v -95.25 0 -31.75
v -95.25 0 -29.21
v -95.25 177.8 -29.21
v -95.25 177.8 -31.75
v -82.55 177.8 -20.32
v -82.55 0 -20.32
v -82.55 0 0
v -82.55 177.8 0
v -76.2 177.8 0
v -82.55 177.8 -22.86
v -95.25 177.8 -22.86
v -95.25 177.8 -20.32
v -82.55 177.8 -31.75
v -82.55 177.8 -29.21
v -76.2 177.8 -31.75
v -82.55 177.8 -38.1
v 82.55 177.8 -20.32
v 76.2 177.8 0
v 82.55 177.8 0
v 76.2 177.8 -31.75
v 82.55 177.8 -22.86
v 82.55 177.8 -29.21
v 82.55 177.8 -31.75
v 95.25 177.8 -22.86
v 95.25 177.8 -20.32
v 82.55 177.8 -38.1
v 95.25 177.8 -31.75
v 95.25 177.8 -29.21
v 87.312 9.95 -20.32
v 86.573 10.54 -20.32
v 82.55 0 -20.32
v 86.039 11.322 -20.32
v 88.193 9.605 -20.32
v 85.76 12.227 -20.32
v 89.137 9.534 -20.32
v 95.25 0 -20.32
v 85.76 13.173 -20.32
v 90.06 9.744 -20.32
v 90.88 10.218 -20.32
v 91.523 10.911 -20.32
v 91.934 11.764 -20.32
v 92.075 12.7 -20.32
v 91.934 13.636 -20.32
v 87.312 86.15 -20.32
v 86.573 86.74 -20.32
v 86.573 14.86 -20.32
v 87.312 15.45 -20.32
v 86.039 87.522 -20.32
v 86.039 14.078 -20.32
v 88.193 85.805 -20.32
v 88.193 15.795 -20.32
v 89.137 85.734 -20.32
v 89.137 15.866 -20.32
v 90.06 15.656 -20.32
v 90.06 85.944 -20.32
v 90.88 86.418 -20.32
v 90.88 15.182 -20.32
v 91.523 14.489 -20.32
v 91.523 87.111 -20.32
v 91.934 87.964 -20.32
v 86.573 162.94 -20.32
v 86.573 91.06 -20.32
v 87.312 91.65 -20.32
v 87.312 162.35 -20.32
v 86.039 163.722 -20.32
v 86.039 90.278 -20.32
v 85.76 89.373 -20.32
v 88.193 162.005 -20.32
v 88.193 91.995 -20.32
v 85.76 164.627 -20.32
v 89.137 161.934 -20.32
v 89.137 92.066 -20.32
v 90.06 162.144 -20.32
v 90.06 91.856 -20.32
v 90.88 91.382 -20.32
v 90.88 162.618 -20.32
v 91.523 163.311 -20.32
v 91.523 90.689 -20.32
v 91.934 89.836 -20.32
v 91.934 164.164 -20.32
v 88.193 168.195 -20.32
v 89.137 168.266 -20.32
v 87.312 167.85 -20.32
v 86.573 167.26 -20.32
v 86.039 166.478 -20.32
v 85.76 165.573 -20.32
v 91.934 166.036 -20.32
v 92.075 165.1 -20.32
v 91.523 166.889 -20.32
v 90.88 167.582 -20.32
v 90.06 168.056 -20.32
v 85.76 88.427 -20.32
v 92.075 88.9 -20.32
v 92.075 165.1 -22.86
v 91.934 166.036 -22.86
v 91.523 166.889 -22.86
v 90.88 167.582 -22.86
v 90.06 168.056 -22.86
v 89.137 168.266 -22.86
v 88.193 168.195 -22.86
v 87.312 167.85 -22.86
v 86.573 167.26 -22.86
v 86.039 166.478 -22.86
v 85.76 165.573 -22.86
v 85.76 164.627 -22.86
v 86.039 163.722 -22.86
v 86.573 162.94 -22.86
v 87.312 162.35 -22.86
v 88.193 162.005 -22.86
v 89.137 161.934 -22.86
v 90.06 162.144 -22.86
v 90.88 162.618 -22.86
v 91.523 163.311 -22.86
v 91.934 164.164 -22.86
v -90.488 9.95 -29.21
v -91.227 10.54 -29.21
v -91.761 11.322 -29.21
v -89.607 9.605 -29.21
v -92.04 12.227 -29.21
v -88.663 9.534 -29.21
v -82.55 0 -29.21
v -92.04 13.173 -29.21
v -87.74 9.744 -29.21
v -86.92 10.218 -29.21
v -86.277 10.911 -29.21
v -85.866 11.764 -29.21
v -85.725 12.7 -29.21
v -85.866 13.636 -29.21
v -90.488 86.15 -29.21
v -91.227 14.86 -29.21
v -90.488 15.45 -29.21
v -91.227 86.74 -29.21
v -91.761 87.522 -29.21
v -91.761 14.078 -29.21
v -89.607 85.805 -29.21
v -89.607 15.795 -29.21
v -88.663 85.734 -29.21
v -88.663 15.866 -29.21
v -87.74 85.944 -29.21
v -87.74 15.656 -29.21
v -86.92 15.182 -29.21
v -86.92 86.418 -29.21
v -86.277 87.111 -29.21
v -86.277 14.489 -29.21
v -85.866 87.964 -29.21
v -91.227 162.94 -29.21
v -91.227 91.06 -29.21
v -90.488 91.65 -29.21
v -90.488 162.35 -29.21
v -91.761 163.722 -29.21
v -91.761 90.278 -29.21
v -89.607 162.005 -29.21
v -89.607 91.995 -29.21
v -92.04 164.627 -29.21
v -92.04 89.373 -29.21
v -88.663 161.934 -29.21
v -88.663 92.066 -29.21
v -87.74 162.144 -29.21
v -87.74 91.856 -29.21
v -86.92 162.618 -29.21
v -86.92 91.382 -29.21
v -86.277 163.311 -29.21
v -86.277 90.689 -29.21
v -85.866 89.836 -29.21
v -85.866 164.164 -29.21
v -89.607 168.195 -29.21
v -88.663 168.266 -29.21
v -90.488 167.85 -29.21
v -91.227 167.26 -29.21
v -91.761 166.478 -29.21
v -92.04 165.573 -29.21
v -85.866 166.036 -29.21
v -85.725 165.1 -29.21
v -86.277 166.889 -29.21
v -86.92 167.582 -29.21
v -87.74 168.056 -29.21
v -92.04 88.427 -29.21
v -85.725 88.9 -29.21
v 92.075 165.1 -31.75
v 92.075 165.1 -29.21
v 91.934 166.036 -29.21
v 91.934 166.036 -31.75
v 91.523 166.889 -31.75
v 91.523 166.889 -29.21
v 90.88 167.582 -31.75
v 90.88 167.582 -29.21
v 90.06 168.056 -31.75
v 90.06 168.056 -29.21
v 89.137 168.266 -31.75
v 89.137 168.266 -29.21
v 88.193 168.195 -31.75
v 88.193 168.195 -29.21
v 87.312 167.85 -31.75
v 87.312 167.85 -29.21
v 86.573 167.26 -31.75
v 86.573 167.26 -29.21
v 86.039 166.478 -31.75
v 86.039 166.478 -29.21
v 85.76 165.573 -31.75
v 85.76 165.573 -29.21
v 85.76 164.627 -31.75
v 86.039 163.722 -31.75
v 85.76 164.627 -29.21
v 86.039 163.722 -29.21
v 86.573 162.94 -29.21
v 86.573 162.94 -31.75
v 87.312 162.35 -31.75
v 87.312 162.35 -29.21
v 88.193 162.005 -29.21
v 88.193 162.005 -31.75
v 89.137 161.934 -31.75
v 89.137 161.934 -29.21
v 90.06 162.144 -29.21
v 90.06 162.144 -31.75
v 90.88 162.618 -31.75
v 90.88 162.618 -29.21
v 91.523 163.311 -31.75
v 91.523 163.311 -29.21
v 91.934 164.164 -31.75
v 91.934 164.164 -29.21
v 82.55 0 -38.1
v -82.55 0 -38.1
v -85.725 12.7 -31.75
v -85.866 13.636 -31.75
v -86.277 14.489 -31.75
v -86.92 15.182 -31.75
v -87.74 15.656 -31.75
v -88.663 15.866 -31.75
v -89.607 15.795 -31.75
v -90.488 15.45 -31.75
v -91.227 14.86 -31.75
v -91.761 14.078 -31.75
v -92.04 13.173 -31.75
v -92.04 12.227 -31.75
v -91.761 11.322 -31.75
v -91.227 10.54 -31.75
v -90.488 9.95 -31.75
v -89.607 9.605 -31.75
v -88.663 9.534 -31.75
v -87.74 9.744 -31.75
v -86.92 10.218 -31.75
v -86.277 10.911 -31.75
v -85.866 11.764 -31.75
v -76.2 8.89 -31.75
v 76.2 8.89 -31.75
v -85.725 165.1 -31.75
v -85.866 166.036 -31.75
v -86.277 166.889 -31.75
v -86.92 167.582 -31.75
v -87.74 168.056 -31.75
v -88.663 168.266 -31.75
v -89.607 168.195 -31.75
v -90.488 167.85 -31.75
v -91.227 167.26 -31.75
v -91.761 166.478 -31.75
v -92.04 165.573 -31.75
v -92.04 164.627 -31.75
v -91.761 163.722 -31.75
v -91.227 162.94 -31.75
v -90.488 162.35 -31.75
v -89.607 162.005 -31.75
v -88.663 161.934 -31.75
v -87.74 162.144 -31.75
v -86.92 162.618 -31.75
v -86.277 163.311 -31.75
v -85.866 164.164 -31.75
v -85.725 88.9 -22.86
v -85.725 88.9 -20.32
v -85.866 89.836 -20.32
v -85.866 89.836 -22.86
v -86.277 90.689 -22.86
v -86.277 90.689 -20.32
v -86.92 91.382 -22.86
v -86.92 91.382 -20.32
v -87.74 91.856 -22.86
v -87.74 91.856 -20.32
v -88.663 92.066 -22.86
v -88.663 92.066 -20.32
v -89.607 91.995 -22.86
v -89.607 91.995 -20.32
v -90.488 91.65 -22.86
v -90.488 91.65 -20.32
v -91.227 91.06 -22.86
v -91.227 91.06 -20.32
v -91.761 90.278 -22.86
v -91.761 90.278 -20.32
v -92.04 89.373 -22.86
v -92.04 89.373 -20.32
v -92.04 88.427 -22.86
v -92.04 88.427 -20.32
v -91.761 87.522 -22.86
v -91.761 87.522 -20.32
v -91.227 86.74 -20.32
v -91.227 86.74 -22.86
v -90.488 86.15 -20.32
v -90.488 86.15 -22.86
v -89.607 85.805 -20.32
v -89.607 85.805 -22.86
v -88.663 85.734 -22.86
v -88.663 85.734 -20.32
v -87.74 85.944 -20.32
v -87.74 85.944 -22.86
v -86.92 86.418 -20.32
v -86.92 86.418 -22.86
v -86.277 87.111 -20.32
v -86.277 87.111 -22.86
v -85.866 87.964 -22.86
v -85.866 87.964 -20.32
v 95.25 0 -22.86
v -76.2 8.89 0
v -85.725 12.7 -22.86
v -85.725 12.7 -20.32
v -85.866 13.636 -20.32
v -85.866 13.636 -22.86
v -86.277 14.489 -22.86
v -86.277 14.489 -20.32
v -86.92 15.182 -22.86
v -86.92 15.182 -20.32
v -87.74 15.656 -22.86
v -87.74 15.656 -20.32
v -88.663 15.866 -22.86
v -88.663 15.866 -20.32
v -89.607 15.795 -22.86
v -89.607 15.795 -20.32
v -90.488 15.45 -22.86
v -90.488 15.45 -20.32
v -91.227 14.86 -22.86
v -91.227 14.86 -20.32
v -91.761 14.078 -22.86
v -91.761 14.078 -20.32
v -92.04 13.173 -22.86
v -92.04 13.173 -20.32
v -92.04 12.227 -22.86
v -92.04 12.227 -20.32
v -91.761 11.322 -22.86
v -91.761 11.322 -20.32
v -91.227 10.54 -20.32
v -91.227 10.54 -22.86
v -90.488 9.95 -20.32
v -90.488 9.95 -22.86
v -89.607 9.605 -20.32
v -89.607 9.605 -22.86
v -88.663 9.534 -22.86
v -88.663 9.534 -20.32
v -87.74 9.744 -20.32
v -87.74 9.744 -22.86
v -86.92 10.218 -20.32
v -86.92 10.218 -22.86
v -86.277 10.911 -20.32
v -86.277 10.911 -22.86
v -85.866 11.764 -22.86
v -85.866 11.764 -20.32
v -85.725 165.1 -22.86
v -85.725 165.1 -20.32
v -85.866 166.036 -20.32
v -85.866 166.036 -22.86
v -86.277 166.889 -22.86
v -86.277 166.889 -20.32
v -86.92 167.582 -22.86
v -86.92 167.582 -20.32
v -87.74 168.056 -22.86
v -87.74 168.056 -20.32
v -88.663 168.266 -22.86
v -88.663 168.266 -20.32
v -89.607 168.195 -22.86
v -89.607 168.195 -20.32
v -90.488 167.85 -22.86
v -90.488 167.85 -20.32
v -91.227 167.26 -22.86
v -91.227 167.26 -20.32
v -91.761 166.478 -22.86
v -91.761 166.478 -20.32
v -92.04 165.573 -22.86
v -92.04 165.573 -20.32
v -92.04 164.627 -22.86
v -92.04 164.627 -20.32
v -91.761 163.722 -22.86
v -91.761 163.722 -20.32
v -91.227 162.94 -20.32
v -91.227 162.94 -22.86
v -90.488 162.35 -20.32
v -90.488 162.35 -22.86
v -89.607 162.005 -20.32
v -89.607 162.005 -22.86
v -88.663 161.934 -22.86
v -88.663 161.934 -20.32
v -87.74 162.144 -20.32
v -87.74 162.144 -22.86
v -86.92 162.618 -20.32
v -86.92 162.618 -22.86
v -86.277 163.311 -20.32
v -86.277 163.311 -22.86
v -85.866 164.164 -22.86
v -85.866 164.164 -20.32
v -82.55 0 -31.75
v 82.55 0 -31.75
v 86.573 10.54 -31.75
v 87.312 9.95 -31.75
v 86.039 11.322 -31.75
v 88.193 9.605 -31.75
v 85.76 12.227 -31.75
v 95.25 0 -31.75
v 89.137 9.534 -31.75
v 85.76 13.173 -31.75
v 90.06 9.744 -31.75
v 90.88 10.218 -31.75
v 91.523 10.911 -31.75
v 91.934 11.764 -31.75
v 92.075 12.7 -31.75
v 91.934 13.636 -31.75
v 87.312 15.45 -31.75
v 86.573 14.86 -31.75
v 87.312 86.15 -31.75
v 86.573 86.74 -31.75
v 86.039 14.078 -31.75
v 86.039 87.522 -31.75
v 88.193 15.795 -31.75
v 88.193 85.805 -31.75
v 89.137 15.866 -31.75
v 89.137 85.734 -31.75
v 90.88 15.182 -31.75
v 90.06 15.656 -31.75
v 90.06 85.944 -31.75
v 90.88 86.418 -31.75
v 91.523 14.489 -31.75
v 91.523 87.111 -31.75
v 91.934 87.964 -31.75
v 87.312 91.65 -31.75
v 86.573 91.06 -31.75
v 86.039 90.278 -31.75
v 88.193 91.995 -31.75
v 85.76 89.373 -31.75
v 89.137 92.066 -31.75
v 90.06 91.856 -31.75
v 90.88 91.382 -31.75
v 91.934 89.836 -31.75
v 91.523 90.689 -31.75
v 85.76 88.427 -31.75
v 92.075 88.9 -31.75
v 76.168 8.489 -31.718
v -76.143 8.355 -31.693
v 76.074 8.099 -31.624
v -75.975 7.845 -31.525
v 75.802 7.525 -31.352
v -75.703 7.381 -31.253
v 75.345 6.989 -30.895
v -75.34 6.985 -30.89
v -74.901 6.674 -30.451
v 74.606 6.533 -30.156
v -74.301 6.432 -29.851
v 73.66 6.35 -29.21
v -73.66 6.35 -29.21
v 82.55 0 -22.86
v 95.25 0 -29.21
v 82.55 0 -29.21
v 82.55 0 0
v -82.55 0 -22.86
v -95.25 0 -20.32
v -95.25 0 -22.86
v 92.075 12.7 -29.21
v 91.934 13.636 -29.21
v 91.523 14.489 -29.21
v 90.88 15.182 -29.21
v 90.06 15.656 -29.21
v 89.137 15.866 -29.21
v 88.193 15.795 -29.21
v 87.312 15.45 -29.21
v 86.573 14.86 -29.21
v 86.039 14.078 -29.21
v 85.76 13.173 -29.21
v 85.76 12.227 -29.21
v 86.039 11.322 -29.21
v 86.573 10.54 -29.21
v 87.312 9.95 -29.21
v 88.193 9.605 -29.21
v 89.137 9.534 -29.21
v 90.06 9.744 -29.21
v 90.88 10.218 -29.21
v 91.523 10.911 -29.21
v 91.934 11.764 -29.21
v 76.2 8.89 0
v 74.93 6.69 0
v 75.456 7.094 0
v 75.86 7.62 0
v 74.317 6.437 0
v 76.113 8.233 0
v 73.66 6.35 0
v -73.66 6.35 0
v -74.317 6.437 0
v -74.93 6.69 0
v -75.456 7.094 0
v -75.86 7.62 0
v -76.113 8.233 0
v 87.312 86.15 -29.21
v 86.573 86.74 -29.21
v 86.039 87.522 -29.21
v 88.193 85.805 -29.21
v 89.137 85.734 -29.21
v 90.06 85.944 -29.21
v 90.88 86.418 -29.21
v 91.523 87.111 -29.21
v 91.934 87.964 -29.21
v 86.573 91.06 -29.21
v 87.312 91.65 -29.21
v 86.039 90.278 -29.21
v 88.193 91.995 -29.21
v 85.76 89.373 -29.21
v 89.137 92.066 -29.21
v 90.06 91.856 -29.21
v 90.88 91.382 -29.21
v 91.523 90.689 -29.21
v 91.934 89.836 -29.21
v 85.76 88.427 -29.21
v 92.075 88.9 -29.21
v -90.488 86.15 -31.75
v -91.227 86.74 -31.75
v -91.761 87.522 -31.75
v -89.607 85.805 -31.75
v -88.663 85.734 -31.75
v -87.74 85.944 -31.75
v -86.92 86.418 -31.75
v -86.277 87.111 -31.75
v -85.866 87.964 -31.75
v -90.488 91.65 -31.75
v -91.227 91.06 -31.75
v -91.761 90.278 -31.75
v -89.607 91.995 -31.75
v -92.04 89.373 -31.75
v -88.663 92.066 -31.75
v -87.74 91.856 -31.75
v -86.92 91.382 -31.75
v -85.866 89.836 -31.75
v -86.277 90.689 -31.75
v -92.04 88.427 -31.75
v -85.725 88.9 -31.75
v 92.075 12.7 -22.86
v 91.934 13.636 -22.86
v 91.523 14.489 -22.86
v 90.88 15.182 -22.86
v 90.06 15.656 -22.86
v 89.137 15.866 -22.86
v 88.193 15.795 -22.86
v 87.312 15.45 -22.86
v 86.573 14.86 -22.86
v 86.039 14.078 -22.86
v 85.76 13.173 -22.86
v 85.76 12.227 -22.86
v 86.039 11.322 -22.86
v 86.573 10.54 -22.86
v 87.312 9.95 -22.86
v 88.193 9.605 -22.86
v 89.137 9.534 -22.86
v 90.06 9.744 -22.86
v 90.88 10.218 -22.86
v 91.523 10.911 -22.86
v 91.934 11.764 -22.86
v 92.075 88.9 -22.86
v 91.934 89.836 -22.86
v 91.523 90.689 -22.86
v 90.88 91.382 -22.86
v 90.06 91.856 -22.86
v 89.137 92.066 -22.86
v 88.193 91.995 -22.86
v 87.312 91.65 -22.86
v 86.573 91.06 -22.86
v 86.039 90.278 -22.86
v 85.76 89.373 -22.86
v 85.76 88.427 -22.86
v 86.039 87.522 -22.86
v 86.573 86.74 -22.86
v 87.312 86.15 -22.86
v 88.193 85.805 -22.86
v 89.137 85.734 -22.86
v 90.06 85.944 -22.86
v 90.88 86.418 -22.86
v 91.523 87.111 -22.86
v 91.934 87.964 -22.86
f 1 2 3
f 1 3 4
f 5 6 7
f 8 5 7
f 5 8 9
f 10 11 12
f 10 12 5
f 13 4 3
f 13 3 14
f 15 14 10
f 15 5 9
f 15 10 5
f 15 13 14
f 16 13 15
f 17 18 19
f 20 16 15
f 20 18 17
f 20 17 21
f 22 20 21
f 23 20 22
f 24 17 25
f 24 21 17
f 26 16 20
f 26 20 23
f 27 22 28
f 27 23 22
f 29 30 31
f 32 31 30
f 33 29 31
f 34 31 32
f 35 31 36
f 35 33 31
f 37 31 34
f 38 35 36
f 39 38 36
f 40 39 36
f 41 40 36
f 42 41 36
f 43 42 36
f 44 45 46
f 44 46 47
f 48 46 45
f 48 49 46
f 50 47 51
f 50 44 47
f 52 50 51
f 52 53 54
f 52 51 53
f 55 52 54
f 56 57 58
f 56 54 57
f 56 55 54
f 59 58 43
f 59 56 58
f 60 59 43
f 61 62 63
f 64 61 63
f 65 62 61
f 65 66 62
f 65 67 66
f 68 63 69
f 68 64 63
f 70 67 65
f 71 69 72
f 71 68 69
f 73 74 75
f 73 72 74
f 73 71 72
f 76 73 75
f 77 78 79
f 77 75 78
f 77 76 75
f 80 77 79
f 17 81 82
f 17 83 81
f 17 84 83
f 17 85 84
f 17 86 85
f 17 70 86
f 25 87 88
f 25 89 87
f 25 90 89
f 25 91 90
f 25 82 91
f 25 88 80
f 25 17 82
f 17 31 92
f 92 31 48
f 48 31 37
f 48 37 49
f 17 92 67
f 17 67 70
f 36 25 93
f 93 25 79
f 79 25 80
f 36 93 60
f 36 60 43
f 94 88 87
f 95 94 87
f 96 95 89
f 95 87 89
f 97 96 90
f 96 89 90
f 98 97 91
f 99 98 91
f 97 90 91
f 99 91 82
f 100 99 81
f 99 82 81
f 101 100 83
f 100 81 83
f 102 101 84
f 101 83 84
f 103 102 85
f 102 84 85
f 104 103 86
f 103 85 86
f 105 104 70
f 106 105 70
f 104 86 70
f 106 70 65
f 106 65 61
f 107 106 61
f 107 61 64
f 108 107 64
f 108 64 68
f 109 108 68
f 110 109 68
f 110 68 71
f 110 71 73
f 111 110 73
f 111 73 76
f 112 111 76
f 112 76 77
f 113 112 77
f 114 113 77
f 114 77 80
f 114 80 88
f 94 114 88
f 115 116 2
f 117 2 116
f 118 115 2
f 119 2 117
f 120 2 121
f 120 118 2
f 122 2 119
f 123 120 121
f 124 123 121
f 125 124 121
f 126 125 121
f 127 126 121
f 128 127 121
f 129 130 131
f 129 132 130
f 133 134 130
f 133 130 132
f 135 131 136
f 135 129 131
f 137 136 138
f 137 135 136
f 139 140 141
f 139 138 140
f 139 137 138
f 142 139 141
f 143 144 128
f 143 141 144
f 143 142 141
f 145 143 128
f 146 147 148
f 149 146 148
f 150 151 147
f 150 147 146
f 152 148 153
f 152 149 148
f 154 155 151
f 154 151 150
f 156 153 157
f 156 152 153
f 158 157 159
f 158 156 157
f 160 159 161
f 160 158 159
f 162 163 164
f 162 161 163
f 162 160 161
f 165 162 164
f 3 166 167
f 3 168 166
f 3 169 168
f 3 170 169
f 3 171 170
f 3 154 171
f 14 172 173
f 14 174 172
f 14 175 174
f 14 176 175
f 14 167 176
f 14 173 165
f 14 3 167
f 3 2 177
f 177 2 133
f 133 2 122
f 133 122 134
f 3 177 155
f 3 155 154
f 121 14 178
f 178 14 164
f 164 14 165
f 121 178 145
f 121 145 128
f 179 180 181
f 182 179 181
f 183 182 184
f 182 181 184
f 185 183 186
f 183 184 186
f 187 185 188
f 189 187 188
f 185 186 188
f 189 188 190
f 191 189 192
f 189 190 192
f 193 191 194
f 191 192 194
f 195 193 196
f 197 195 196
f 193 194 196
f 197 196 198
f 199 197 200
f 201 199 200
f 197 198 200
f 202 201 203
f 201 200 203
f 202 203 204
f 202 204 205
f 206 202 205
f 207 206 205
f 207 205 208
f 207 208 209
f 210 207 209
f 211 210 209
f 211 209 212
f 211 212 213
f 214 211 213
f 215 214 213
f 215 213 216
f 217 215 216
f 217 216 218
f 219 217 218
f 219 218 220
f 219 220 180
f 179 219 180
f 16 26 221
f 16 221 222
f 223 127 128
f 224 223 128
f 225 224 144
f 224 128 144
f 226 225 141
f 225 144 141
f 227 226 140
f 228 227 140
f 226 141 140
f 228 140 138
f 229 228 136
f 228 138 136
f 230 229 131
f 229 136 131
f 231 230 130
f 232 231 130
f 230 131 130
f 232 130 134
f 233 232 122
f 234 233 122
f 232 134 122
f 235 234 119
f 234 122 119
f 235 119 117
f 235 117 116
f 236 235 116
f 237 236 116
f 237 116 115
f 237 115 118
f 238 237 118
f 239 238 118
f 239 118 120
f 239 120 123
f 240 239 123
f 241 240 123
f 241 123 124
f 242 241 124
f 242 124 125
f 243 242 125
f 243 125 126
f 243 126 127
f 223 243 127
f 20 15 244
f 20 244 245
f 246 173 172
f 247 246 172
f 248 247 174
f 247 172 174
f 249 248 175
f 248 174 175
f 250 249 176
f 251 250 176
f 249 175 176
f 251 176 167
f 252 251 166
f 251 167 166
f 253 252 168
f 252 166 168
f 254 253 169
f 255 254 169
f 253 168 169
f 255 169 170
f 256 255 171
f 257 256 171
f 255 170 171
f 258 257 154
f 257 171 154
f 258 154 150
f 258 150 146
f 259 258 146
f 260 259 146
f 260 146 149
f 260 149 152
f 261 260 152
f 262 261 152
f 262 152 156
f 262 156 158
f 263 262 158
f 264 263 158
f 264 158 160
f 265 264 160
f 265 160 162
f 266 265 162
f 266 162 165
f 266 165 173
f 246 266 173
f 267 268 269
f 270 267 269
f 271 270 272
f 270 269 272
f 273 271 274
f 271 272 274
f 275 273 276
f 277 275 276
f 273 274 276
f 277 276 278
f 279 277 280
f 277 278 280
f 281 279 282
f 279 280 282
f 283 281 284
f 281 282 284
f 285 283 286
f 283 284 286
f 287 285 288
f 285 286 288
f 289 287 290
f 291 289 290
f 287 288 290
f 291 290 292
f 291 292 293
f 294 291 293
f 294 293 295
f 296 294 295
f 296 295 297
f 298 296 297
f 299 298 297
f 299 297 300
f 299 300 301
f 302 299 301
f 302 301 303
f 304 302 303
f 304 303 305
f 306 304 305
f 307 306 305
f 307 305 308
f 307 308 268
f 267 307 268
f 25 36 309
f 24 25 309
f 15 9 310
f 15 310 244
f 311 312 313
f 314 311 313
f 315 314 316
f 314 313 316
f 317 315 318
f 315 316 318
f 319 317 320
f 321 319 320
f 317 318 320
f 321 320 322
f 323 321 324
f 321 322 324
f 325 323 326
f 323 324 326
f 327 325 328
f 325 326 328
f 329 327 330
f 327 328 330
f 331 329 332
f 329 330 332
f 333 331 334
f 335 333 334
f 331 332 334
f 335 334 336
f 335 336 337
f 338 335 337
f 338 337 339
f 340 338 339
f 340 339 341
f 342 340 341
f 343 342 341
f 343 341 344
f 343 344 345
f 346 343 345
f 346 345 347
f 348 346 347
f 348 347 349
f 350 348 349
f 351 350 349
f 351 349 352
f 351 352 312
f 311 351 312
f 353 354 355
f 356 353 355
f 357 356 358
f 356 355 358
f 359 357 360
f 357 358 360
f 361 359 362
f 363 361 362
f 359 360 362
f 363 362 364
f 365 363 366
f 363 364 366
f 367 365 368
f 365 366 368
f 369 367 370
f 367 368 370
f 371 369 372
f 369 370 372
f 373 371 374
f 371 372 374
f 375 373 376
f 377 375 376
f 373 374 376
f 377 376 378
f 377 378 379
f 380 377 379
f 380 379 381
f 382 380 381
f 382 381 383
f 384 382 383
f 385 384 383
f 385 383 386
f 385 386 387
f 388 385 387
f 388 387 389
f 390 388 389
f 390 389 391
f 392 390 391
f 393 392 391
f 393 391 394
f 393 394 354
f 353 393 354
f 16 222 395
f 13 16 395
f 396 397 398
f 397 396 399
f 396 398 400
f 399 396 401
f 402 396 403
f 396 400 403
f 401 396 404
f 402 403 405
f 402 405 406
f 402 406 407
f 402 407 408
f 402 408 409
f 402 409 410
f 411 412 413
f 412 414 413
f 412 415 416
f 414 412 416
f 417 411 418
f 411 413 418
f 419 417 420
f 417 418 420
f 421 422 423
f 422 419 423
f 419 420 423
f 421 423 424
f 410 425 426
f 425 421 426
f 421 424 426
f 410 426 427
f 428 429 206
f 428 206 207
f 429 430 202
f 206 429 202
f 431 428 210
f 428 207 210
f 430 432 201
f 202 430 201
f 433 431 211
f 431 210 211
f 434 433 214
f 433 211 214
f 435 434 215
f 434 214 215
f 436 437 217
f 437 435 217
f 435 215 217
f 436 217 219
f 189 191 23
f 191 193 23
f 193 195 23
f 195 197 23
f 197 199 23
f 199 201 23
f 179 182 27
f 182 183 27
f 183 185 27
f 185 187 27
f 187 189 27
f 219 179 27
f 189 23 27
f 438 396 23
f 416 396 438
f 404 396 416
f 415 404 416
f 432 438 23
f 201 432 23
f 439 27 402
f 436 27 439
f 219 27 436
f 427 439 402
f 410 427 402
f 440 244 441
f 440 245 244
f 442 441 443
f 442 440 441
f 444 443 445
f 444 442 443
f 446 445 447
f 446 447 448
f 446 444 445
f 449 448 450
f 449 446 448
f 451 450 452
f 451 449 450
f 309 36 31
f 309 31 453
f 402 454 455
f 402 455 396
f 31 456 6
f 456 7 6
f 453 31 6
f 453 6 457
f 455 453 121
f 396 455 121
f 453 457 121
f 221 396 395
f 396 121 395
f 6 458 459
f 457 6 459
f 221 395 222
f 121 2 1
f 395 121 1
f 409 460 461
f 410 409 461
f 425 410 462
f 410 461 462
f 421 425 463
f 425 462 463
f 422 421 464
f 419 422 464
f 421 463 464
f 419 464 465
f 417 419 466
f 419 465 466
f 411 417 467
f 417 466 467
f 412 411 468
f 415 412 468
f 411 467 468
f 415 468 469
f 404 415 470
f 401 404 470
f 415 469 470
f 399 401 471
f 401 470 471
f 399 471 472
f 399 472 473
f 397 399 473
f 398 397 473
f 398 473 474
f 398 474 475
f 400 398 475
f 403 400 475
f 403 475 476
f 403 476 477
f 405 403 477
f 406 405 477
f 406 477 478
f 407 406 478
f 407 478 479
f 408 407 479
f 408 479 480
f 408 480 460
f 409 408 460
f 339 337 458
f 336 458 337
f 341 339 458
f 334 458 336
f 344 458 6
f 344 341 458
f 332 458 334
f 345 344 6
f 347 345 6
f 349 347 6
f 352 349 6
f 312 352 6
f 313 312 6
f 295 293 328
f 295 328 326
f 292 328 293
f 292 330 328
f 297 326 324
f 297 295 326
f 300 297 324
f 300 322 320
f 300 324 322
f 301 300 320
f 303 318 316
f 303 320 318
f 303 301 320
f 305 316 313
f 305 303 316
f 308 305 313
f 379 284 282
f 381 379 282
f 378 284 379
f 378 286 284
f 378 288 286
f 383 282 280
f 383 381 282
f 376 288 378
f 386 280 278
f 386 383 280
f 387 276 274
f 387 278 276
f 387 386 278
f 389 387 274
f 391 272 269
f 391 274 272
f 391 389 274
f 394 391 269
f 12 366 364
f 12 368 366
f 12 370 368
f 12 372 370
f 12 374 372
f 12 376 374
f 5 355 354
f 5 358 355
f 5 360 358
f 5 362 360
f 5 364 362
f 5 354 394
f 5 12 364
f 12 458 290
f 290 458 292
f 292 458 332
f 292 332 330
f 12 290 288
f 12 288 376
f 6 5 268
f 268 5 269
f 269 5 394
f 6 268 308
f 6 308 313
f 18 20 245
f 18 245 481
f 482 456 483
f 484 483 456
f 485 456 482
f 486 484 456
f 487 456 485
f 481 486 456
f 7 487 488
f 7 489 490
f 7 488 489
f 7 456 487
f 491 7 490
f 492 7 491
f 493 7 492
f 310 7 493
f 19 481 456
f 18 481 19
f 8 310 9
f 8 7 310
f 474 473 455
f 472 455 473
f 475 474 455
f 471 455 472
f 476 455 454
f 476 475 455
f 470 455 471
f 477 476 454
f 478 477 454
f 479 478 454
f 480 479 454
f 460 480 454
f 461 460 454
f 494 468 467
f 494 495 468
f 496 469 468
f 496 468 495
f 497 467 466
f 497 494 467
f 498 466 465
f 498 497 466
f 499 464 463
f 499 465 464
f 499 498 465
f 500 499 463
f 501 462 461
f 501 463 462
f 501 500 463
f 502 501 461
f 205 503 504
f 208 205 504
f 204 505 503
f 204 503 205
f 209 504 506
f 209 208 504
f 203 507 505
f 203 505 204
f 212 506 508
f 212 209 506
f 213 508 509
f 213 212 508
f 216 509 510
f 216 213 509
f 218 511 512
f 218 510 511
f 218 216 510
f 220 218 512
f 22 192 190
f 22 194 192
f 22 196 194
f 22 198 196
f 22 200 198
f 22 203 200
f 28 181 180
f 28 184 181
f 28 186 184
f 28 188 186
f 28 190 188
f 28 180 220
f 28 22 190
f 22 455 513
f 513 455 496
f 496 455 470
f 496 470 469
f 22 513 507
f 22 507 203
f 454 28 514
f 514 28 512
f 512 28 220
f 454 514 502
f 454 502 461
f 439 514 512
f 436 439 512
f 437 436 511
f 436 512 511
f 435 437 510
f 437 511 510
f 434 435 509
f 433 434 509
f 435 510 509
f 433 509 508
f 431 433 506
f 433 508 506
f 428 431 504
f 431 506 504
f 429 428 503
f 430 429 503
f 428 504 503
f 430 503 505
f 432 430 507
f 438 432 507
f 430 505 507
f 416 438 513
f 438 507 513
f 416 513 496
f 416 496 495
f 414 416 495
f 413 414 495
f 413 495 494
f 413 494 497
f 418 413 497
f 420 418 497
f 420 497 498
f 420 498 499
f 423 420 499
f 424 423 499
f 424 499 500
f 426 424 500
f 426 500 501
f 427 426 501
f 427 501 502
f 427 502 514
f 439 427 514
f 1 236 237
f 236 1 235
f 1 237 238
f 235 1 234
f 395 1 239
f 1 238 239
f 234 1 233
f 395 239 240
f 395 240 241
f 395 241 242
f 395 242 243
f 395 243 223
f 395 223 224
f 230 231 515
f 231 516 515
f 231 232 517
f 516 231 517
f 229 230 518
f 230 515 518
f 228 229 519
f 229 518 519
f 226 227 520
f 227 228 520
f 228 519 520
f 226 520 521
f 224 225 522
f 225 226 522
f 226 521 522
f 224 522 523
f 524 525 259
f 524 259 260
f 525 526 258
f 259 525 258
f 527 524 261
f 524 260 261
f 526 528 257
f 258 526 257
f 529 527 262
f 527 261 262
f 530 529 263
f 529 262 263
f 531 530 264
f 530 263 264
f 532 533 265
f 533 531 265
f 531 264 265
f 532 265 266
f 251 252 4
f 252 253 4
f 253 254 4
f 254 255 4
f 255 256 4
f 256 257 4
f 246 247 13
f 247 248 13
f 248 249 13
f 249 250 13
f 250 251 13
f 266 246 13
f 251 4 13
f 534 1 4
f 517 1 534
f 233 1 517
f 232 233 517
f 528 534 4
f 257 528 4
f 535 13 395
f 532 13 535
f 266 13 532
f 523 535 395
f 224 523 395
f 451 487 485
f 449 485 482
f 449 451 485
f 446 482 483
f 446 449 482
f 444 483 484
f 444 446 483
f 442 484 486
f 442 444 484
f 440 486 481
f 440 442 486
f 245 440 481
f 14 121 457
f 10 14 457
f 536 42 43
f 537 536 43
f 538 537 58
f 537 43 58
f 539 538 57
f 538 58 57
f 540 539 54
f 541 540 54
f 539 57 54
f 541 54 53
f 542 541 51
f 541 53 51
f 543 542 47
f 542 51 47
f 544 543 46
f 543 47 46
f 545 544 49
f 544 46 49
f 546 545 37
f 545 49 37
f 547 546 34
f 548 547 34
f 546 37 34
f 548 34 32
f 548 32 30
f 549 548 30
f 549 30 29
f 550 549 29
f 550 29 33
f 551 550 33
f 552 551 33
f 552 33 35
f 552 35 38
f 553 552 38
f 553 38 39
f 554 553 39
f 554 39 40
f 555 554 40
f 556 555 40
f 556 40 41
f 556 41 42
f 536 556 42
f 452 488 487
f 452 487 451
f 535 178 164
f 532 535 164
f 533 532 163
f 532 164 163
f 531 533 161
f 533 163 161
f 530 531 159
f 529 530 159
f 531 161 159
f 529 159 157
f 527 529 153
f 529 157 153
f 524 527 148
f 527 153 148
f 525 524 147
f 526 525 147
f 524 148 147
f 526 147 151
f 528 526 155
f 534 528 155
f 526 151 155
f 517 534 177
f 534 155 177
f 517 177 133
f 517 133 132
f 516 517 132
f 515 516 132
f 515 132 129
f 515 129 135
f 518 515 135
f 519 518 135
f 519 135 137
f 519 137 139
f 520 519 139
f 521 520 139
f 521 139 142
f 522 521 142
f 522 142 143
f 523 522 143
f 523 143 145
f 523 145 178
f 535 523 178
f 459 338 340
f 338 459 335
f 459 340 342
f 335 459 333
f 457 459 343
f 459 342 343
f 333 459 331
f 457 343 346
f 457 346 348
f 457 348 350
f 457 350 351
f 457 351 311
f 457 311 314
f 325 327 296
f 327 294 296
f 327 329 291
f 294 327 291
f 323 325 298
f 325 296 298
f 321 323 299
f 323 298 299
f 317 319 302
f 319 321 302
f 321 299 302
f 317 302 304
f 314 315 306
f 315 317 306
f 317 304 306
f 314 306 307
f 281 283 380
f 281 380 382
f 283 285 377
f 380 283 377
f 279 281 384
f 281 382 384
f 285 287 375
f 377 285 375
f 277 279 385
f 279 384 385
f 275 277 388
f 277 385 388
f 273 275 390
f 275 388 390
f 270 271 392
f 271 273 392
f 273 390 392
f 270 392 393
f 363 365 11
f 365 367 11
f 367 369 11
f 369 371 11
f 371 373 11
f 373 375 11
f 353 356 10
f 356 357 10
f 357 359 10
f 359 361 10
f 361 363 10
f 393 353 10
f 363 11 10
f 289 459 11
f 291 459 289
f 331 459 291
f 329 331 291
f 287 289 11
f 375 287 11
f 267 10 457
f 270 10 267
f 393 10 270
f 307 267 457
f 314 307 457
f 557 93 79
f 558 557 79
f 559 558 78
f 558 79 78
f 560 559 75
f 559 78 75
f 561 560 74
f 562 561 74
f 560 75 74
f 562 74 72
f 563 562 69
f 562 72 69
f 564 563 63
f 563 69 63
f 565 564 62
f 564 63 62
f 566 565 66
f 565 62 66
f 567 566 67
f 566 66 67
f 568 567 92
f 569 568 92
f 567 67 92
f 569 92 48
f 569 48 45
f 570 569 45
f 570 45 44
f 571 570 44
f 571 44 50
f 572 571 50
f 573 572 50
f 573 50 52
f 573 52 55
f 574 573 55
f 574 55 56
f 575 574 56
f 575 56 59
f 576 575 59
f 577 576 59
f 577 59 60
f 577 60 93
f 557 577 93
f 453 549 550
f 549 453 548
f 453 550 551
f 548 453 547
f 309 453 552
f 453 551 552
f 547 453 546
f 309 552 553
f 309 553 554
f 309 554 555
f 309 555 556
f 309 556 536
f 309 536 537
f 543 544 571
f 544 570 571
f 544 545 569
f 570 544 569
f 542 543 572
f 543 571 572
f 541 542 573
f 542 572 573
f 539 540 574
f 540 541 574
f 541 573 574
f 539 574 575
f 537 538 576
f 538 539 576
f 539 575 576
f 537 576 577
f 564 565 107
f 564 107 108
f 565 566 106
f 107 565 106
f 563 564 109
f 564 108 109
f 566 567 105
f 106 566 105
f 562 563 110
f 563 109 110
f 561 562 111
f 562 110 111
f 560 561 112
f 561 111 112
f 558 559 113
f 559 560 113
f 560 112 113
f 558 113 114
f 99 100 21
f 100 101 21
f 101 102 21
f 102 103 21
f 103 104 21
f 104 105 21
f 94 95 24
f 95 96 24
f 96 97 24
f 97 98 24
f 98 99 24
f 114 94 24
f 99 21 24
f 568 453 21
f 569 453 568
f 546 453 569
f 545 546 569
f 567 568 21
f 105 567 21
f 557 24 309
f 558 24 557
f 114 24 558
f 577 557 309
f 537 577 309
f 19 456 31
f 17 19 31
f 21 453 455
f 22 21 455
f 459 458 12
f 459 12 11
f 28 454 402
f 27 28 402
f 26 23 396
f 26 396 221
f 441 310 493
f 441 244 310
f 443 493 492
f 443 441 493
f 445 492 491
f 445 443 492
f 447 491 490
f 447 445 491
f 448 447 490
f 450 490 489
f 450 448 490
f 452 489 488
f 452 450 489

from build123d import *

# Parameters (mm, degrees)
BOSS_EXTRUDE1_DEPTH = 177.8
SKETCH2_W           = 12.7
SKETCH2_H           = 2.54
BOSS_EXTRUDE2_DEPTH = 177.8
SKETCH3_R           = 3.175
CUT_EXTRUDE1_DEPTH  = 203.727168628
SKETCH4_W           = 31.75
SKETCH4_H           = 6.35
BOSS_EXTRUDE3_DEPTH = 152.4
FILLET1_R           = 2.54


with BuildPart() as part:
    # Sketch1 → Boss-Extrude1 (new body)
    with BuildSketch(Plane(origin=(0, 0, 0), x_dir=(1, 0, 0), z_dir=(0, 1, 0))):
        Polygon((76.2, 0), (82.55, 0), (82.55, 38.1), (-82.55, 38.1), (-82.55, 0), (-76.2, 0), (-76.2, 31.75), (76.2, 31.75), align=None)
    extrude(amount=BOSS_EXTRUDE1_DEPTH)

    # Sketch2 → Boss-Extrude2 (add)
    with BuildSketch(Plane(origin=(0, 177.8, 0), x_dir=(1, 0, 0), z_dir=(0, 1, 0))):
        with Locations((88.9, 30.48)):
            Rectangle(SKETCH2_W, SKETCH2_H)
        with Locations((88.9, 21.59)):
            Rectangle(SKETCH2_W, SKETCH2_H)
        with Locations((-88.9, 21.59)):
            Rectangle(SKETCH2_W, SKETCH2_H)
        with Locations((-88.9, 30.48)):
            Rectangle(SKETCH2_W, SKETCH2_H)
    extrude(amount=-BOSS_EXTRUDE2_DEPTH)

    # Sketch3 → Cut-Extrude1 (cut, through all)
    with BuildSketch(Plane.XY.offset(-20.32)):
        with Locations((88.9, 12.7)):
            Circle(SKETCH3_R)
        with Locations((88.9, 88.9)):
            Circle(SKETCH3_R)
        with Locations((88.9, 165.1)):
            Circle(SKETCH3_R)
        with Locations((-88.9, 12.7)):
            Circle(SKETCH3_R)
        with Locations((-88.9, 165.1)):
            Circle(SKETCH3_R)
        with Locations((-88.9, 88.9)):
            Circle(SKETCH3_R)
    extrude(amount=-CUT_EXTRUDE1_DEPTH, mode=Mode.SUBTRACT)

    # Sketch4 → Boss-Extrude3 (add)
    with BuildSketch(Plane(origin=(-76.2, 0, 0), x_dir=(0, 0, -1), z_dir=(1, 0, 0))):
        with Locations((15.875, 3.175)):
            Rectangle(SKETCH4_W, SKETCH4_H)
    extrude(amount=BOSS_EXTRUDE3_DEPTH)

    # Fillet1
    fillet1_edges = [part.edges().sort_by_distance(p)[0] for p in [
        (76.2, 6.35, -15.875),
        (0, 6.35, -31.75),
        (-76.2, 6.35, -15.875),
    ]]
    fillet(fillet1_edges, radius=FILLET1_R)


solid = part.part
